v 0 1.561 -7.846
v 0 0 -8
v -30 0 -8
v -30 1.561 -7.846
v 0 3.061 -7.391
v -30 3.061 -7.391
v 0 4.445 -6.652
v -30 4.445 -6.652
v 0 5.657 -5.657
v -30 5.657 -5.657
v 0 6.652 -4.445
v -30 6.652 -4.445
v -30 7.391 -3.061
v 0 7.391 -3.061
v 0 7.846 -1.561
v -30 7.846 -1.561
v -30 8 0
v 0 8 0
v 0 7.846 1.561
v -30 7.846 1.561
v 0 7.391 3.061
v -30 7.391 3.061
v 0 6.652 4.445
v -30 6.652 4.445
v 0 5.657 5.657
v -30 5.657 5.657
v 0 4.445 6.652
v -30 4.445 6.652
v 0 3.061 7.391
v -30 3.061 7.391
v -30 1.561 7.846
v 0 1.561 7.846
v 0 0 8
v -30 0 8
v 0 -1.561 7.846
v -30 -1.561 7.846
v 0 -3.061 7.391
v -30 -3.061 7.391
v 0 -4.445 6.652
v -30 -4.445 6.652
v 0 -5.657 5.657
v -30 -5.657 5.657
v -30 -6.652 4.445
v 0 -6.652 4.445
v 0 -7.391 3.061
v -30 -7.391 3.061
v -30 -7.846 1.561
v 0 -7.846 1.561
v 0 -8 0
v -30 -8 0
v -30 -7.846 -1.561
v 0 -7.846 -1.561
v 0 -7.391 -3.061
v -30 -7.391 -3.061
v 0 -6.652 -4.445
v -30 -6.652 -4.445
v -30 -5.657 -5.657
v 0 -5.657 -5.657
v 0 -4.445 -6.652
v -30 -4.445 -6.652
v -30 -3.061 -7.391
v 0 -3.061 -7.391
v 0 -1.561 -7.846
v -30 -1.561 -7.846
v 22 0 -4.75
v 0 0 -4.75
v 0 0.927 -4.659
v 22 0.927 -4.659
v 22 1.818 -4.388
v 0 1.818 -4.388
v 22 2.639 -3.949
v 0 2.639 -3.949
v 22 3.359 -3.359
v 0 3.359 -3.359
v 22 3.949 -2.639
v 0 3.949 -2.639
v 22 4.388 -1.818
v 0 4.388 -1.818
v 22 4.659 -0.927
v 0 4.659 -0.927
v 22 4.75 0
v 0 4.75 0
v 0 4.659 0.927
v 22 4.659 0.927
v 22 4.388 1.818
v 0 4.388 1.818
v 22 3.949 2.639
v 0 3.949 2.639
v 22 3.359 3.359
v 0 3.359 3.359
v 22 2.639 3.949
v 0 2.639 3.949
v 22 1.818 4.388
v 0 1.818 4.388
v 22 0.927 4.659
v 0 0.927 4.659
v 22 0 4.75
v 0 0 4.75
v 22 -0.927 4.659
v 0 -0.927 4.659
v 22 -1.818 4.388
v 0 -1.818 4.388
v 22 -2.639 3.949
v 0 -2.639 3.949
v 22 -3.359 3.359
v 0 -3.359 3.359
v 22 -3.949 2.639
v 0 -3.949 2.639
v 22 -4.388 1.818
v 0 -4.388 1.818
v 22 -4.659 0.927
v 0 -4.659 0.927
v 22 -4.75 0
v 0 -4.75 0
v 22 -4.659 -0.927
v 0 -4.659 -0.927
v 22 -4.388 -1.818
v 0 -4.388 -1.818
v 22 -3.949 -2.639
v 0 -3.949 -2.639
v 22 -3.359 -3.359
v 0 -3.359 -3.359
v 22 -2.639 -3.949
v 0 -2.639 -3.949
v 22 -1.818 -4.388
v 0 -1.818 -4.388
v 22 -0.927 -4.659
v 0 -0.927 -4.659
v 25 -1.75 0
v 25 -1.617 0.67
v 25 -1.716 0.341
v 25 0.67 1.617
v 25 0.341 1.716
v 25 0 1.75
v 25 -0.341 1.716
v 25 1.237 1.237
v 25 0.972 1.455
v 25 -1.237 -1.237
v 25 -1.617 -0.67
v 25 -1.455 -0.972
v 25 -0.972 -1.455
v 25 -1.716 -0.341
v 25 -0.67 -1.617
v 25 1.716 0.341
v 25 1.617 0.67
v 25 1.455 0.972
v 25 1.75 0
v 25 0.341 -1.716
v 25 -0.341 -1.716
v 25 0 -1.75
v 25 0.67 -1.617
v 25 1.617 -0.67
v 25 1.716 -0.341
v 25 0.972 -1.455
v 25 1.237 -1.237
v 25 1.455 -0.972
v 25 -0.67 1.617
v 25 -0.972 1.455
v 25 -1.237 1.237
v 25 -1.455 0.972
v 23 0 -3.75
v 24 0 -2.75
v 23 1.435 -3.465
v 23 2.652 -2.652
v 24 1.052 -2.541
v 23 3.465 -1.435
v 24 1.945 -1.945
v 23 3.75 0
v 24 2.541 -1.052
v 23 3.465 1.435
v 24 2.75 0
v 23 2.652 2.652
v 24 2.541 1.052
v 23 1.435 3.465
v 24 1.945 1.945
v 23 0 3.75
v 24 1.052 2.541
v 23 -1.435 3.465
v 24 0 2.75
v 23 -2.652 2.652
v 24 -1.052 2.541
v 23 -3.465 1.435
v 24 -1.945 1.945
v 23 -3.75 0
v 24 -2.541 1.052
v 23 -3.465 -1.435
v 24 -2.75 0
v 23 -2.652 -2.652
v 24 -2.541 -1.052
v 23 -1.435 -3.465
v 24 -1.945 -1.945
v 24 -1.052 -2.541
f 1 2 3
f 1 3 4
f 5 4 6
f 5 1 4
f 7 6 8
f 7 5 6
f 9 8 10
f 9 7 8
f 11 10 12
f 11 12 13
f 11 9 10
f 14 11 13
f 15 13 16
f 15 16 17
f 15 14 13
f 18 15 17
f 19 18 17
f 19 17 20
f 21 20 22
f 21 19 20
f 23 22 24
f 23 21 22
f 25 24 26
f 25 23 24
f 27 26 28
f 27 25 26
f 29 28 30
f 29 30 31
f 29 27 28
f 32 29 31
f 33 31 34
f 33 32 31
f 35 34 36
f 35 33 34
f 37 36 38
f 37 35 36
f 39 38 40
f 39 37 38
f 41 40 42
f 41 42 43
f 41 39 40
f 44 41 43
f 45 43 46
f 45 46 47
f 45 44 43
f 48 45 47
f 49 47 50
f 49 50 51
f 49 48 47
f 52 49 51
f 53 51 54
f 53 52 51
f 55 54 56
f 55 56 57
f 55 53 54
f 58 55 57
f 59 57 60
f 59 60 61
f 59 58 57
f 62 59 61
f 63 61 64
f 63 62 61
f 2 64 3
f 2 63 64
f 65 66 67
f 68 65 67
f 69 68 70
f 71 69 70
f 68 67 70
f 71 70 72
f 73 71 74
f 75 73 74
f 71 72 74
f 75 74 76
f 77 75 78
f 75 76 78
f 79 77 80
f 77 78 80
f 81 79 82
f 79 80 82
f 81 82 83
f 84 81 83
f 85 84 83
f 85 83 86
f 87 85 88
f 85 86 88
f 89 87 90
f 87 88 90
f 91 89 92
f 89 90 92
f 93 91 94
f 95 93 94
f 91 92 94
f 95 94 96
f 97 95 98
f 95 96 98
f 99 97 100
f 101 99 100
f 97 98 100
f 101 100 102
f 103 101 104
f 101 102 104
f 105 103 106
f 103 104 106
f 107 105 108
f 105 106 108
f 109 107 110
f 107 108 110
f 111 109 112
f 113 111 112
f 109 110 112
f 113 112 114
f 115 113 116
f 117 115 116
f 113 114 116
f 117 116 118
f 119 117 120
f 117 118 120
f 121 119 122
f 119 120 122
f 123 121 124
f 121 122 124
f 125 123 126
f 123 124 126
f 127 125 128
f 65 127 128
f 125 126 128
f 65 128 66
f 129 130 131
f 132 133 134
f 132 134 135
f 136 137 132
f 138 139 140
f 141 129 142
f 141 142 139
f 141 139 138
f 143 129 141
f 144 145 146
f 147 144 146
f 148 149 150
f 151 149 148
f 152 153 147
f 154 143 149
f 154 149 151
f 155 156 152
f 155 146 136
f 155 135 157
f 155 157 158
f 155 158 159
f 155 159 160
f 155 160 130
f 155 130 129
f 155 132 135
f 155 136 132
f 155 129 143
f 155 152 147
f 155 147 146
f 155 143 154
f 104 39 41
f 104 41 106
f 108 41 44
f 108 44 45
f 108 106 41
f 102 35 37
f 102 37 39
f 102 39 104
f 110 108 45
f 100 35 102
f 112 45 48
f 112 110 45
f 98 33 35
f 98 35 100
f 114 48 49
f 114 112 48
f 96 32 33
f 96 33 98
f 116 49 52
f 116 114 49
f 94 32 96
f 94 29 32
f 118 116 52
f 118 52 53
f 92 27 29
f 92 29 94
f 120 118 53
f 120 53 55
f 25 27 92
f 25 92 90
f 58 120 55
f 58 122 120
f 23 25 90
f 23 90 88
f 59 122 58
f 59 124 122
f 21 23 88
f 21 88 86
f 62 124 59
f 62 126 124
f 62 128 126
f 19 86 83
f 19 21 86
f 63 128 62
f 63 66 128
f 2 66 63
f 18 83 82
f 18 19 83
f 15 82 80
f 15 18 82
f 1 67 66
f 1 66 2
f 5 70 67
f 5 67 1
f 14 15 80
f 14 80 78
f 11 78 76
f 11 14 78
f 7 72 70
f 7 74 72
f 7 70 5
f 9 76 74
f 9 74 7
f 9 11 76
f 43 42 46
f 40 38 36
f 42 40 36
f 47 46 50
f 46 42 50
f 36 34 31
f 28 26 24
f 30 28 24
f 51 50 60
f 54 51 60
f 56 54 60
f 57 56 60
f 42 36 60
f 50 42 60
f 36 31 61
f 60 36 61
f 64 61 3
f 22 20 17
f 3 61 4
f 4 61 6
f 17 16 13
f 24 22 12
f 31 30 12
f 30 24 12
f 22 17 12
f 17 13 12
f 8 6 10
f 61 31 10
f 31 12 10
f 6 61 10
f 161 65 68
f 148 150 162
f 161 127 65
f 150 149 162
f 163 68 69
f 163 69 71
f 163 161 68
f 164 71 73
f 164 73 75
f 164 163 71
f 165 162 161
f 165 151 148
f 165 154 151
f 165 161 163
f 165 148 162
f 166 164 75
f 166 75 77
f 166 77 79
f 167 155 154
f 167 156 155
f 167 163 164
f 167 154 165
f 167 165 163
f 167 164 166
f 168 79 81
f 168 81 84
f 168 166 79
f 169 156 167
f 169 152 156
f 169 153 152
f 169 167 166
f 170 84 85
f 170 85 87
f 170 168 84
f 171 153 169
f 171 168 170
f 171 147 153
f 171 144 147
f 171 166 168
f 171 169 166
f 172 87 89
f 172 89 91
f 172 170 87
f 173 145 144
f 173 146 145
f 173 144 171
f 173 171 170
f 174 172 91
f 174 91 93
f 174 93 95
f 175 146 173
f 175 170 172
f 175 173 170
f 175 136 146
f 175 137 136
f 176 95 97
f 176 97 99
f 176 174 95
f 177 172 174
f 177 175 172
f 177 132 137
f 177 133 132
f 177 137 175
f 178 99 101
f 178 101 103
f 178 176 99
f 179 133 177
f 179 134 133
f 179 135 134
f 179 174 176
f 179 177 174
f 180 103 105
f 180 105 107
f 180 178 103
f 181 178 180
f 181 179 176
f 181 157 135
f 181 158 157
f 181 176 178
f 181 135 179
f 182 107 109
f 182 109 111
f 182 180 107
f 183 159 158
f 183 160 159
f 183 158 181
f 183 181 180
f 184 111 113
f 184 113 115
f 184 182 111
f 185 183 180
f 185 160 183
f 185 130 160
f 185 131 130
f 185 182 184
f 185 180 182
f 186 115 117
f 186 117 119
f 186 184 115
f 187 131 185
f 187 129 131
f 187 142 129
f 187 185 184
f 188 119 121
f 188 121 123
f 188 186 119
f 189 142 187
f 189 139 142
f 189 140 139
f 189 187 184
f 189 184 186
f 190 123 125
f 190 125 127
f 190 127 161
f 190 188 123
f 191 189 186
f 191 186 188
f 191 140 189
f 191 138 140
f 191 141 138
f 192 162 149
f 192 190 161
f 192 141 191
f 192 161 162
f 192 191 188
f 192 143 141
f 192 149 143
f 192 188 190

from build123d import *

# Parameters (mm, degrees)
SKETCH_1_R      = 8
EXTRUDE_1_DEPTH = 30
SKETCH_2_R      = 4.75
EXTRUDE_2_DEPTH = 25
CHAMFER_1_SIZE  = 3


with BuildPart() as part:
    # Эскиз1 → Бобышка-Вытянуть1 (new body)
    with BuildSketch(Plane(origin=(0, 0, 0), x_dir=(0, 0, -1), z_dir=(1, 0, 0))):
        Circle(SKETCH_1_R)
    extrude(amount=-EXTRUDE_1_DEPTH)

    # Эскиз2 → Бобышка-Вытянуть2 (add)
    with BuildSketch(Plane(origin=(0, 0, 0), x_dir=(0, 0, -1), z_dir=(1, 0, 0))):
        Circle(SKETCH_2_R)
    extrude(amount=EXTRUDE_2_DEPTH)

    # Фаска1
    chamfer_1_edges = [part.edges().sort_by_distance(p)[0] for p in [
        (25, 0, 4.75),
    ]]
    chamfer(chamfer_1_edges, length=CHAMFER_1_SIZE)


solid = part.part
